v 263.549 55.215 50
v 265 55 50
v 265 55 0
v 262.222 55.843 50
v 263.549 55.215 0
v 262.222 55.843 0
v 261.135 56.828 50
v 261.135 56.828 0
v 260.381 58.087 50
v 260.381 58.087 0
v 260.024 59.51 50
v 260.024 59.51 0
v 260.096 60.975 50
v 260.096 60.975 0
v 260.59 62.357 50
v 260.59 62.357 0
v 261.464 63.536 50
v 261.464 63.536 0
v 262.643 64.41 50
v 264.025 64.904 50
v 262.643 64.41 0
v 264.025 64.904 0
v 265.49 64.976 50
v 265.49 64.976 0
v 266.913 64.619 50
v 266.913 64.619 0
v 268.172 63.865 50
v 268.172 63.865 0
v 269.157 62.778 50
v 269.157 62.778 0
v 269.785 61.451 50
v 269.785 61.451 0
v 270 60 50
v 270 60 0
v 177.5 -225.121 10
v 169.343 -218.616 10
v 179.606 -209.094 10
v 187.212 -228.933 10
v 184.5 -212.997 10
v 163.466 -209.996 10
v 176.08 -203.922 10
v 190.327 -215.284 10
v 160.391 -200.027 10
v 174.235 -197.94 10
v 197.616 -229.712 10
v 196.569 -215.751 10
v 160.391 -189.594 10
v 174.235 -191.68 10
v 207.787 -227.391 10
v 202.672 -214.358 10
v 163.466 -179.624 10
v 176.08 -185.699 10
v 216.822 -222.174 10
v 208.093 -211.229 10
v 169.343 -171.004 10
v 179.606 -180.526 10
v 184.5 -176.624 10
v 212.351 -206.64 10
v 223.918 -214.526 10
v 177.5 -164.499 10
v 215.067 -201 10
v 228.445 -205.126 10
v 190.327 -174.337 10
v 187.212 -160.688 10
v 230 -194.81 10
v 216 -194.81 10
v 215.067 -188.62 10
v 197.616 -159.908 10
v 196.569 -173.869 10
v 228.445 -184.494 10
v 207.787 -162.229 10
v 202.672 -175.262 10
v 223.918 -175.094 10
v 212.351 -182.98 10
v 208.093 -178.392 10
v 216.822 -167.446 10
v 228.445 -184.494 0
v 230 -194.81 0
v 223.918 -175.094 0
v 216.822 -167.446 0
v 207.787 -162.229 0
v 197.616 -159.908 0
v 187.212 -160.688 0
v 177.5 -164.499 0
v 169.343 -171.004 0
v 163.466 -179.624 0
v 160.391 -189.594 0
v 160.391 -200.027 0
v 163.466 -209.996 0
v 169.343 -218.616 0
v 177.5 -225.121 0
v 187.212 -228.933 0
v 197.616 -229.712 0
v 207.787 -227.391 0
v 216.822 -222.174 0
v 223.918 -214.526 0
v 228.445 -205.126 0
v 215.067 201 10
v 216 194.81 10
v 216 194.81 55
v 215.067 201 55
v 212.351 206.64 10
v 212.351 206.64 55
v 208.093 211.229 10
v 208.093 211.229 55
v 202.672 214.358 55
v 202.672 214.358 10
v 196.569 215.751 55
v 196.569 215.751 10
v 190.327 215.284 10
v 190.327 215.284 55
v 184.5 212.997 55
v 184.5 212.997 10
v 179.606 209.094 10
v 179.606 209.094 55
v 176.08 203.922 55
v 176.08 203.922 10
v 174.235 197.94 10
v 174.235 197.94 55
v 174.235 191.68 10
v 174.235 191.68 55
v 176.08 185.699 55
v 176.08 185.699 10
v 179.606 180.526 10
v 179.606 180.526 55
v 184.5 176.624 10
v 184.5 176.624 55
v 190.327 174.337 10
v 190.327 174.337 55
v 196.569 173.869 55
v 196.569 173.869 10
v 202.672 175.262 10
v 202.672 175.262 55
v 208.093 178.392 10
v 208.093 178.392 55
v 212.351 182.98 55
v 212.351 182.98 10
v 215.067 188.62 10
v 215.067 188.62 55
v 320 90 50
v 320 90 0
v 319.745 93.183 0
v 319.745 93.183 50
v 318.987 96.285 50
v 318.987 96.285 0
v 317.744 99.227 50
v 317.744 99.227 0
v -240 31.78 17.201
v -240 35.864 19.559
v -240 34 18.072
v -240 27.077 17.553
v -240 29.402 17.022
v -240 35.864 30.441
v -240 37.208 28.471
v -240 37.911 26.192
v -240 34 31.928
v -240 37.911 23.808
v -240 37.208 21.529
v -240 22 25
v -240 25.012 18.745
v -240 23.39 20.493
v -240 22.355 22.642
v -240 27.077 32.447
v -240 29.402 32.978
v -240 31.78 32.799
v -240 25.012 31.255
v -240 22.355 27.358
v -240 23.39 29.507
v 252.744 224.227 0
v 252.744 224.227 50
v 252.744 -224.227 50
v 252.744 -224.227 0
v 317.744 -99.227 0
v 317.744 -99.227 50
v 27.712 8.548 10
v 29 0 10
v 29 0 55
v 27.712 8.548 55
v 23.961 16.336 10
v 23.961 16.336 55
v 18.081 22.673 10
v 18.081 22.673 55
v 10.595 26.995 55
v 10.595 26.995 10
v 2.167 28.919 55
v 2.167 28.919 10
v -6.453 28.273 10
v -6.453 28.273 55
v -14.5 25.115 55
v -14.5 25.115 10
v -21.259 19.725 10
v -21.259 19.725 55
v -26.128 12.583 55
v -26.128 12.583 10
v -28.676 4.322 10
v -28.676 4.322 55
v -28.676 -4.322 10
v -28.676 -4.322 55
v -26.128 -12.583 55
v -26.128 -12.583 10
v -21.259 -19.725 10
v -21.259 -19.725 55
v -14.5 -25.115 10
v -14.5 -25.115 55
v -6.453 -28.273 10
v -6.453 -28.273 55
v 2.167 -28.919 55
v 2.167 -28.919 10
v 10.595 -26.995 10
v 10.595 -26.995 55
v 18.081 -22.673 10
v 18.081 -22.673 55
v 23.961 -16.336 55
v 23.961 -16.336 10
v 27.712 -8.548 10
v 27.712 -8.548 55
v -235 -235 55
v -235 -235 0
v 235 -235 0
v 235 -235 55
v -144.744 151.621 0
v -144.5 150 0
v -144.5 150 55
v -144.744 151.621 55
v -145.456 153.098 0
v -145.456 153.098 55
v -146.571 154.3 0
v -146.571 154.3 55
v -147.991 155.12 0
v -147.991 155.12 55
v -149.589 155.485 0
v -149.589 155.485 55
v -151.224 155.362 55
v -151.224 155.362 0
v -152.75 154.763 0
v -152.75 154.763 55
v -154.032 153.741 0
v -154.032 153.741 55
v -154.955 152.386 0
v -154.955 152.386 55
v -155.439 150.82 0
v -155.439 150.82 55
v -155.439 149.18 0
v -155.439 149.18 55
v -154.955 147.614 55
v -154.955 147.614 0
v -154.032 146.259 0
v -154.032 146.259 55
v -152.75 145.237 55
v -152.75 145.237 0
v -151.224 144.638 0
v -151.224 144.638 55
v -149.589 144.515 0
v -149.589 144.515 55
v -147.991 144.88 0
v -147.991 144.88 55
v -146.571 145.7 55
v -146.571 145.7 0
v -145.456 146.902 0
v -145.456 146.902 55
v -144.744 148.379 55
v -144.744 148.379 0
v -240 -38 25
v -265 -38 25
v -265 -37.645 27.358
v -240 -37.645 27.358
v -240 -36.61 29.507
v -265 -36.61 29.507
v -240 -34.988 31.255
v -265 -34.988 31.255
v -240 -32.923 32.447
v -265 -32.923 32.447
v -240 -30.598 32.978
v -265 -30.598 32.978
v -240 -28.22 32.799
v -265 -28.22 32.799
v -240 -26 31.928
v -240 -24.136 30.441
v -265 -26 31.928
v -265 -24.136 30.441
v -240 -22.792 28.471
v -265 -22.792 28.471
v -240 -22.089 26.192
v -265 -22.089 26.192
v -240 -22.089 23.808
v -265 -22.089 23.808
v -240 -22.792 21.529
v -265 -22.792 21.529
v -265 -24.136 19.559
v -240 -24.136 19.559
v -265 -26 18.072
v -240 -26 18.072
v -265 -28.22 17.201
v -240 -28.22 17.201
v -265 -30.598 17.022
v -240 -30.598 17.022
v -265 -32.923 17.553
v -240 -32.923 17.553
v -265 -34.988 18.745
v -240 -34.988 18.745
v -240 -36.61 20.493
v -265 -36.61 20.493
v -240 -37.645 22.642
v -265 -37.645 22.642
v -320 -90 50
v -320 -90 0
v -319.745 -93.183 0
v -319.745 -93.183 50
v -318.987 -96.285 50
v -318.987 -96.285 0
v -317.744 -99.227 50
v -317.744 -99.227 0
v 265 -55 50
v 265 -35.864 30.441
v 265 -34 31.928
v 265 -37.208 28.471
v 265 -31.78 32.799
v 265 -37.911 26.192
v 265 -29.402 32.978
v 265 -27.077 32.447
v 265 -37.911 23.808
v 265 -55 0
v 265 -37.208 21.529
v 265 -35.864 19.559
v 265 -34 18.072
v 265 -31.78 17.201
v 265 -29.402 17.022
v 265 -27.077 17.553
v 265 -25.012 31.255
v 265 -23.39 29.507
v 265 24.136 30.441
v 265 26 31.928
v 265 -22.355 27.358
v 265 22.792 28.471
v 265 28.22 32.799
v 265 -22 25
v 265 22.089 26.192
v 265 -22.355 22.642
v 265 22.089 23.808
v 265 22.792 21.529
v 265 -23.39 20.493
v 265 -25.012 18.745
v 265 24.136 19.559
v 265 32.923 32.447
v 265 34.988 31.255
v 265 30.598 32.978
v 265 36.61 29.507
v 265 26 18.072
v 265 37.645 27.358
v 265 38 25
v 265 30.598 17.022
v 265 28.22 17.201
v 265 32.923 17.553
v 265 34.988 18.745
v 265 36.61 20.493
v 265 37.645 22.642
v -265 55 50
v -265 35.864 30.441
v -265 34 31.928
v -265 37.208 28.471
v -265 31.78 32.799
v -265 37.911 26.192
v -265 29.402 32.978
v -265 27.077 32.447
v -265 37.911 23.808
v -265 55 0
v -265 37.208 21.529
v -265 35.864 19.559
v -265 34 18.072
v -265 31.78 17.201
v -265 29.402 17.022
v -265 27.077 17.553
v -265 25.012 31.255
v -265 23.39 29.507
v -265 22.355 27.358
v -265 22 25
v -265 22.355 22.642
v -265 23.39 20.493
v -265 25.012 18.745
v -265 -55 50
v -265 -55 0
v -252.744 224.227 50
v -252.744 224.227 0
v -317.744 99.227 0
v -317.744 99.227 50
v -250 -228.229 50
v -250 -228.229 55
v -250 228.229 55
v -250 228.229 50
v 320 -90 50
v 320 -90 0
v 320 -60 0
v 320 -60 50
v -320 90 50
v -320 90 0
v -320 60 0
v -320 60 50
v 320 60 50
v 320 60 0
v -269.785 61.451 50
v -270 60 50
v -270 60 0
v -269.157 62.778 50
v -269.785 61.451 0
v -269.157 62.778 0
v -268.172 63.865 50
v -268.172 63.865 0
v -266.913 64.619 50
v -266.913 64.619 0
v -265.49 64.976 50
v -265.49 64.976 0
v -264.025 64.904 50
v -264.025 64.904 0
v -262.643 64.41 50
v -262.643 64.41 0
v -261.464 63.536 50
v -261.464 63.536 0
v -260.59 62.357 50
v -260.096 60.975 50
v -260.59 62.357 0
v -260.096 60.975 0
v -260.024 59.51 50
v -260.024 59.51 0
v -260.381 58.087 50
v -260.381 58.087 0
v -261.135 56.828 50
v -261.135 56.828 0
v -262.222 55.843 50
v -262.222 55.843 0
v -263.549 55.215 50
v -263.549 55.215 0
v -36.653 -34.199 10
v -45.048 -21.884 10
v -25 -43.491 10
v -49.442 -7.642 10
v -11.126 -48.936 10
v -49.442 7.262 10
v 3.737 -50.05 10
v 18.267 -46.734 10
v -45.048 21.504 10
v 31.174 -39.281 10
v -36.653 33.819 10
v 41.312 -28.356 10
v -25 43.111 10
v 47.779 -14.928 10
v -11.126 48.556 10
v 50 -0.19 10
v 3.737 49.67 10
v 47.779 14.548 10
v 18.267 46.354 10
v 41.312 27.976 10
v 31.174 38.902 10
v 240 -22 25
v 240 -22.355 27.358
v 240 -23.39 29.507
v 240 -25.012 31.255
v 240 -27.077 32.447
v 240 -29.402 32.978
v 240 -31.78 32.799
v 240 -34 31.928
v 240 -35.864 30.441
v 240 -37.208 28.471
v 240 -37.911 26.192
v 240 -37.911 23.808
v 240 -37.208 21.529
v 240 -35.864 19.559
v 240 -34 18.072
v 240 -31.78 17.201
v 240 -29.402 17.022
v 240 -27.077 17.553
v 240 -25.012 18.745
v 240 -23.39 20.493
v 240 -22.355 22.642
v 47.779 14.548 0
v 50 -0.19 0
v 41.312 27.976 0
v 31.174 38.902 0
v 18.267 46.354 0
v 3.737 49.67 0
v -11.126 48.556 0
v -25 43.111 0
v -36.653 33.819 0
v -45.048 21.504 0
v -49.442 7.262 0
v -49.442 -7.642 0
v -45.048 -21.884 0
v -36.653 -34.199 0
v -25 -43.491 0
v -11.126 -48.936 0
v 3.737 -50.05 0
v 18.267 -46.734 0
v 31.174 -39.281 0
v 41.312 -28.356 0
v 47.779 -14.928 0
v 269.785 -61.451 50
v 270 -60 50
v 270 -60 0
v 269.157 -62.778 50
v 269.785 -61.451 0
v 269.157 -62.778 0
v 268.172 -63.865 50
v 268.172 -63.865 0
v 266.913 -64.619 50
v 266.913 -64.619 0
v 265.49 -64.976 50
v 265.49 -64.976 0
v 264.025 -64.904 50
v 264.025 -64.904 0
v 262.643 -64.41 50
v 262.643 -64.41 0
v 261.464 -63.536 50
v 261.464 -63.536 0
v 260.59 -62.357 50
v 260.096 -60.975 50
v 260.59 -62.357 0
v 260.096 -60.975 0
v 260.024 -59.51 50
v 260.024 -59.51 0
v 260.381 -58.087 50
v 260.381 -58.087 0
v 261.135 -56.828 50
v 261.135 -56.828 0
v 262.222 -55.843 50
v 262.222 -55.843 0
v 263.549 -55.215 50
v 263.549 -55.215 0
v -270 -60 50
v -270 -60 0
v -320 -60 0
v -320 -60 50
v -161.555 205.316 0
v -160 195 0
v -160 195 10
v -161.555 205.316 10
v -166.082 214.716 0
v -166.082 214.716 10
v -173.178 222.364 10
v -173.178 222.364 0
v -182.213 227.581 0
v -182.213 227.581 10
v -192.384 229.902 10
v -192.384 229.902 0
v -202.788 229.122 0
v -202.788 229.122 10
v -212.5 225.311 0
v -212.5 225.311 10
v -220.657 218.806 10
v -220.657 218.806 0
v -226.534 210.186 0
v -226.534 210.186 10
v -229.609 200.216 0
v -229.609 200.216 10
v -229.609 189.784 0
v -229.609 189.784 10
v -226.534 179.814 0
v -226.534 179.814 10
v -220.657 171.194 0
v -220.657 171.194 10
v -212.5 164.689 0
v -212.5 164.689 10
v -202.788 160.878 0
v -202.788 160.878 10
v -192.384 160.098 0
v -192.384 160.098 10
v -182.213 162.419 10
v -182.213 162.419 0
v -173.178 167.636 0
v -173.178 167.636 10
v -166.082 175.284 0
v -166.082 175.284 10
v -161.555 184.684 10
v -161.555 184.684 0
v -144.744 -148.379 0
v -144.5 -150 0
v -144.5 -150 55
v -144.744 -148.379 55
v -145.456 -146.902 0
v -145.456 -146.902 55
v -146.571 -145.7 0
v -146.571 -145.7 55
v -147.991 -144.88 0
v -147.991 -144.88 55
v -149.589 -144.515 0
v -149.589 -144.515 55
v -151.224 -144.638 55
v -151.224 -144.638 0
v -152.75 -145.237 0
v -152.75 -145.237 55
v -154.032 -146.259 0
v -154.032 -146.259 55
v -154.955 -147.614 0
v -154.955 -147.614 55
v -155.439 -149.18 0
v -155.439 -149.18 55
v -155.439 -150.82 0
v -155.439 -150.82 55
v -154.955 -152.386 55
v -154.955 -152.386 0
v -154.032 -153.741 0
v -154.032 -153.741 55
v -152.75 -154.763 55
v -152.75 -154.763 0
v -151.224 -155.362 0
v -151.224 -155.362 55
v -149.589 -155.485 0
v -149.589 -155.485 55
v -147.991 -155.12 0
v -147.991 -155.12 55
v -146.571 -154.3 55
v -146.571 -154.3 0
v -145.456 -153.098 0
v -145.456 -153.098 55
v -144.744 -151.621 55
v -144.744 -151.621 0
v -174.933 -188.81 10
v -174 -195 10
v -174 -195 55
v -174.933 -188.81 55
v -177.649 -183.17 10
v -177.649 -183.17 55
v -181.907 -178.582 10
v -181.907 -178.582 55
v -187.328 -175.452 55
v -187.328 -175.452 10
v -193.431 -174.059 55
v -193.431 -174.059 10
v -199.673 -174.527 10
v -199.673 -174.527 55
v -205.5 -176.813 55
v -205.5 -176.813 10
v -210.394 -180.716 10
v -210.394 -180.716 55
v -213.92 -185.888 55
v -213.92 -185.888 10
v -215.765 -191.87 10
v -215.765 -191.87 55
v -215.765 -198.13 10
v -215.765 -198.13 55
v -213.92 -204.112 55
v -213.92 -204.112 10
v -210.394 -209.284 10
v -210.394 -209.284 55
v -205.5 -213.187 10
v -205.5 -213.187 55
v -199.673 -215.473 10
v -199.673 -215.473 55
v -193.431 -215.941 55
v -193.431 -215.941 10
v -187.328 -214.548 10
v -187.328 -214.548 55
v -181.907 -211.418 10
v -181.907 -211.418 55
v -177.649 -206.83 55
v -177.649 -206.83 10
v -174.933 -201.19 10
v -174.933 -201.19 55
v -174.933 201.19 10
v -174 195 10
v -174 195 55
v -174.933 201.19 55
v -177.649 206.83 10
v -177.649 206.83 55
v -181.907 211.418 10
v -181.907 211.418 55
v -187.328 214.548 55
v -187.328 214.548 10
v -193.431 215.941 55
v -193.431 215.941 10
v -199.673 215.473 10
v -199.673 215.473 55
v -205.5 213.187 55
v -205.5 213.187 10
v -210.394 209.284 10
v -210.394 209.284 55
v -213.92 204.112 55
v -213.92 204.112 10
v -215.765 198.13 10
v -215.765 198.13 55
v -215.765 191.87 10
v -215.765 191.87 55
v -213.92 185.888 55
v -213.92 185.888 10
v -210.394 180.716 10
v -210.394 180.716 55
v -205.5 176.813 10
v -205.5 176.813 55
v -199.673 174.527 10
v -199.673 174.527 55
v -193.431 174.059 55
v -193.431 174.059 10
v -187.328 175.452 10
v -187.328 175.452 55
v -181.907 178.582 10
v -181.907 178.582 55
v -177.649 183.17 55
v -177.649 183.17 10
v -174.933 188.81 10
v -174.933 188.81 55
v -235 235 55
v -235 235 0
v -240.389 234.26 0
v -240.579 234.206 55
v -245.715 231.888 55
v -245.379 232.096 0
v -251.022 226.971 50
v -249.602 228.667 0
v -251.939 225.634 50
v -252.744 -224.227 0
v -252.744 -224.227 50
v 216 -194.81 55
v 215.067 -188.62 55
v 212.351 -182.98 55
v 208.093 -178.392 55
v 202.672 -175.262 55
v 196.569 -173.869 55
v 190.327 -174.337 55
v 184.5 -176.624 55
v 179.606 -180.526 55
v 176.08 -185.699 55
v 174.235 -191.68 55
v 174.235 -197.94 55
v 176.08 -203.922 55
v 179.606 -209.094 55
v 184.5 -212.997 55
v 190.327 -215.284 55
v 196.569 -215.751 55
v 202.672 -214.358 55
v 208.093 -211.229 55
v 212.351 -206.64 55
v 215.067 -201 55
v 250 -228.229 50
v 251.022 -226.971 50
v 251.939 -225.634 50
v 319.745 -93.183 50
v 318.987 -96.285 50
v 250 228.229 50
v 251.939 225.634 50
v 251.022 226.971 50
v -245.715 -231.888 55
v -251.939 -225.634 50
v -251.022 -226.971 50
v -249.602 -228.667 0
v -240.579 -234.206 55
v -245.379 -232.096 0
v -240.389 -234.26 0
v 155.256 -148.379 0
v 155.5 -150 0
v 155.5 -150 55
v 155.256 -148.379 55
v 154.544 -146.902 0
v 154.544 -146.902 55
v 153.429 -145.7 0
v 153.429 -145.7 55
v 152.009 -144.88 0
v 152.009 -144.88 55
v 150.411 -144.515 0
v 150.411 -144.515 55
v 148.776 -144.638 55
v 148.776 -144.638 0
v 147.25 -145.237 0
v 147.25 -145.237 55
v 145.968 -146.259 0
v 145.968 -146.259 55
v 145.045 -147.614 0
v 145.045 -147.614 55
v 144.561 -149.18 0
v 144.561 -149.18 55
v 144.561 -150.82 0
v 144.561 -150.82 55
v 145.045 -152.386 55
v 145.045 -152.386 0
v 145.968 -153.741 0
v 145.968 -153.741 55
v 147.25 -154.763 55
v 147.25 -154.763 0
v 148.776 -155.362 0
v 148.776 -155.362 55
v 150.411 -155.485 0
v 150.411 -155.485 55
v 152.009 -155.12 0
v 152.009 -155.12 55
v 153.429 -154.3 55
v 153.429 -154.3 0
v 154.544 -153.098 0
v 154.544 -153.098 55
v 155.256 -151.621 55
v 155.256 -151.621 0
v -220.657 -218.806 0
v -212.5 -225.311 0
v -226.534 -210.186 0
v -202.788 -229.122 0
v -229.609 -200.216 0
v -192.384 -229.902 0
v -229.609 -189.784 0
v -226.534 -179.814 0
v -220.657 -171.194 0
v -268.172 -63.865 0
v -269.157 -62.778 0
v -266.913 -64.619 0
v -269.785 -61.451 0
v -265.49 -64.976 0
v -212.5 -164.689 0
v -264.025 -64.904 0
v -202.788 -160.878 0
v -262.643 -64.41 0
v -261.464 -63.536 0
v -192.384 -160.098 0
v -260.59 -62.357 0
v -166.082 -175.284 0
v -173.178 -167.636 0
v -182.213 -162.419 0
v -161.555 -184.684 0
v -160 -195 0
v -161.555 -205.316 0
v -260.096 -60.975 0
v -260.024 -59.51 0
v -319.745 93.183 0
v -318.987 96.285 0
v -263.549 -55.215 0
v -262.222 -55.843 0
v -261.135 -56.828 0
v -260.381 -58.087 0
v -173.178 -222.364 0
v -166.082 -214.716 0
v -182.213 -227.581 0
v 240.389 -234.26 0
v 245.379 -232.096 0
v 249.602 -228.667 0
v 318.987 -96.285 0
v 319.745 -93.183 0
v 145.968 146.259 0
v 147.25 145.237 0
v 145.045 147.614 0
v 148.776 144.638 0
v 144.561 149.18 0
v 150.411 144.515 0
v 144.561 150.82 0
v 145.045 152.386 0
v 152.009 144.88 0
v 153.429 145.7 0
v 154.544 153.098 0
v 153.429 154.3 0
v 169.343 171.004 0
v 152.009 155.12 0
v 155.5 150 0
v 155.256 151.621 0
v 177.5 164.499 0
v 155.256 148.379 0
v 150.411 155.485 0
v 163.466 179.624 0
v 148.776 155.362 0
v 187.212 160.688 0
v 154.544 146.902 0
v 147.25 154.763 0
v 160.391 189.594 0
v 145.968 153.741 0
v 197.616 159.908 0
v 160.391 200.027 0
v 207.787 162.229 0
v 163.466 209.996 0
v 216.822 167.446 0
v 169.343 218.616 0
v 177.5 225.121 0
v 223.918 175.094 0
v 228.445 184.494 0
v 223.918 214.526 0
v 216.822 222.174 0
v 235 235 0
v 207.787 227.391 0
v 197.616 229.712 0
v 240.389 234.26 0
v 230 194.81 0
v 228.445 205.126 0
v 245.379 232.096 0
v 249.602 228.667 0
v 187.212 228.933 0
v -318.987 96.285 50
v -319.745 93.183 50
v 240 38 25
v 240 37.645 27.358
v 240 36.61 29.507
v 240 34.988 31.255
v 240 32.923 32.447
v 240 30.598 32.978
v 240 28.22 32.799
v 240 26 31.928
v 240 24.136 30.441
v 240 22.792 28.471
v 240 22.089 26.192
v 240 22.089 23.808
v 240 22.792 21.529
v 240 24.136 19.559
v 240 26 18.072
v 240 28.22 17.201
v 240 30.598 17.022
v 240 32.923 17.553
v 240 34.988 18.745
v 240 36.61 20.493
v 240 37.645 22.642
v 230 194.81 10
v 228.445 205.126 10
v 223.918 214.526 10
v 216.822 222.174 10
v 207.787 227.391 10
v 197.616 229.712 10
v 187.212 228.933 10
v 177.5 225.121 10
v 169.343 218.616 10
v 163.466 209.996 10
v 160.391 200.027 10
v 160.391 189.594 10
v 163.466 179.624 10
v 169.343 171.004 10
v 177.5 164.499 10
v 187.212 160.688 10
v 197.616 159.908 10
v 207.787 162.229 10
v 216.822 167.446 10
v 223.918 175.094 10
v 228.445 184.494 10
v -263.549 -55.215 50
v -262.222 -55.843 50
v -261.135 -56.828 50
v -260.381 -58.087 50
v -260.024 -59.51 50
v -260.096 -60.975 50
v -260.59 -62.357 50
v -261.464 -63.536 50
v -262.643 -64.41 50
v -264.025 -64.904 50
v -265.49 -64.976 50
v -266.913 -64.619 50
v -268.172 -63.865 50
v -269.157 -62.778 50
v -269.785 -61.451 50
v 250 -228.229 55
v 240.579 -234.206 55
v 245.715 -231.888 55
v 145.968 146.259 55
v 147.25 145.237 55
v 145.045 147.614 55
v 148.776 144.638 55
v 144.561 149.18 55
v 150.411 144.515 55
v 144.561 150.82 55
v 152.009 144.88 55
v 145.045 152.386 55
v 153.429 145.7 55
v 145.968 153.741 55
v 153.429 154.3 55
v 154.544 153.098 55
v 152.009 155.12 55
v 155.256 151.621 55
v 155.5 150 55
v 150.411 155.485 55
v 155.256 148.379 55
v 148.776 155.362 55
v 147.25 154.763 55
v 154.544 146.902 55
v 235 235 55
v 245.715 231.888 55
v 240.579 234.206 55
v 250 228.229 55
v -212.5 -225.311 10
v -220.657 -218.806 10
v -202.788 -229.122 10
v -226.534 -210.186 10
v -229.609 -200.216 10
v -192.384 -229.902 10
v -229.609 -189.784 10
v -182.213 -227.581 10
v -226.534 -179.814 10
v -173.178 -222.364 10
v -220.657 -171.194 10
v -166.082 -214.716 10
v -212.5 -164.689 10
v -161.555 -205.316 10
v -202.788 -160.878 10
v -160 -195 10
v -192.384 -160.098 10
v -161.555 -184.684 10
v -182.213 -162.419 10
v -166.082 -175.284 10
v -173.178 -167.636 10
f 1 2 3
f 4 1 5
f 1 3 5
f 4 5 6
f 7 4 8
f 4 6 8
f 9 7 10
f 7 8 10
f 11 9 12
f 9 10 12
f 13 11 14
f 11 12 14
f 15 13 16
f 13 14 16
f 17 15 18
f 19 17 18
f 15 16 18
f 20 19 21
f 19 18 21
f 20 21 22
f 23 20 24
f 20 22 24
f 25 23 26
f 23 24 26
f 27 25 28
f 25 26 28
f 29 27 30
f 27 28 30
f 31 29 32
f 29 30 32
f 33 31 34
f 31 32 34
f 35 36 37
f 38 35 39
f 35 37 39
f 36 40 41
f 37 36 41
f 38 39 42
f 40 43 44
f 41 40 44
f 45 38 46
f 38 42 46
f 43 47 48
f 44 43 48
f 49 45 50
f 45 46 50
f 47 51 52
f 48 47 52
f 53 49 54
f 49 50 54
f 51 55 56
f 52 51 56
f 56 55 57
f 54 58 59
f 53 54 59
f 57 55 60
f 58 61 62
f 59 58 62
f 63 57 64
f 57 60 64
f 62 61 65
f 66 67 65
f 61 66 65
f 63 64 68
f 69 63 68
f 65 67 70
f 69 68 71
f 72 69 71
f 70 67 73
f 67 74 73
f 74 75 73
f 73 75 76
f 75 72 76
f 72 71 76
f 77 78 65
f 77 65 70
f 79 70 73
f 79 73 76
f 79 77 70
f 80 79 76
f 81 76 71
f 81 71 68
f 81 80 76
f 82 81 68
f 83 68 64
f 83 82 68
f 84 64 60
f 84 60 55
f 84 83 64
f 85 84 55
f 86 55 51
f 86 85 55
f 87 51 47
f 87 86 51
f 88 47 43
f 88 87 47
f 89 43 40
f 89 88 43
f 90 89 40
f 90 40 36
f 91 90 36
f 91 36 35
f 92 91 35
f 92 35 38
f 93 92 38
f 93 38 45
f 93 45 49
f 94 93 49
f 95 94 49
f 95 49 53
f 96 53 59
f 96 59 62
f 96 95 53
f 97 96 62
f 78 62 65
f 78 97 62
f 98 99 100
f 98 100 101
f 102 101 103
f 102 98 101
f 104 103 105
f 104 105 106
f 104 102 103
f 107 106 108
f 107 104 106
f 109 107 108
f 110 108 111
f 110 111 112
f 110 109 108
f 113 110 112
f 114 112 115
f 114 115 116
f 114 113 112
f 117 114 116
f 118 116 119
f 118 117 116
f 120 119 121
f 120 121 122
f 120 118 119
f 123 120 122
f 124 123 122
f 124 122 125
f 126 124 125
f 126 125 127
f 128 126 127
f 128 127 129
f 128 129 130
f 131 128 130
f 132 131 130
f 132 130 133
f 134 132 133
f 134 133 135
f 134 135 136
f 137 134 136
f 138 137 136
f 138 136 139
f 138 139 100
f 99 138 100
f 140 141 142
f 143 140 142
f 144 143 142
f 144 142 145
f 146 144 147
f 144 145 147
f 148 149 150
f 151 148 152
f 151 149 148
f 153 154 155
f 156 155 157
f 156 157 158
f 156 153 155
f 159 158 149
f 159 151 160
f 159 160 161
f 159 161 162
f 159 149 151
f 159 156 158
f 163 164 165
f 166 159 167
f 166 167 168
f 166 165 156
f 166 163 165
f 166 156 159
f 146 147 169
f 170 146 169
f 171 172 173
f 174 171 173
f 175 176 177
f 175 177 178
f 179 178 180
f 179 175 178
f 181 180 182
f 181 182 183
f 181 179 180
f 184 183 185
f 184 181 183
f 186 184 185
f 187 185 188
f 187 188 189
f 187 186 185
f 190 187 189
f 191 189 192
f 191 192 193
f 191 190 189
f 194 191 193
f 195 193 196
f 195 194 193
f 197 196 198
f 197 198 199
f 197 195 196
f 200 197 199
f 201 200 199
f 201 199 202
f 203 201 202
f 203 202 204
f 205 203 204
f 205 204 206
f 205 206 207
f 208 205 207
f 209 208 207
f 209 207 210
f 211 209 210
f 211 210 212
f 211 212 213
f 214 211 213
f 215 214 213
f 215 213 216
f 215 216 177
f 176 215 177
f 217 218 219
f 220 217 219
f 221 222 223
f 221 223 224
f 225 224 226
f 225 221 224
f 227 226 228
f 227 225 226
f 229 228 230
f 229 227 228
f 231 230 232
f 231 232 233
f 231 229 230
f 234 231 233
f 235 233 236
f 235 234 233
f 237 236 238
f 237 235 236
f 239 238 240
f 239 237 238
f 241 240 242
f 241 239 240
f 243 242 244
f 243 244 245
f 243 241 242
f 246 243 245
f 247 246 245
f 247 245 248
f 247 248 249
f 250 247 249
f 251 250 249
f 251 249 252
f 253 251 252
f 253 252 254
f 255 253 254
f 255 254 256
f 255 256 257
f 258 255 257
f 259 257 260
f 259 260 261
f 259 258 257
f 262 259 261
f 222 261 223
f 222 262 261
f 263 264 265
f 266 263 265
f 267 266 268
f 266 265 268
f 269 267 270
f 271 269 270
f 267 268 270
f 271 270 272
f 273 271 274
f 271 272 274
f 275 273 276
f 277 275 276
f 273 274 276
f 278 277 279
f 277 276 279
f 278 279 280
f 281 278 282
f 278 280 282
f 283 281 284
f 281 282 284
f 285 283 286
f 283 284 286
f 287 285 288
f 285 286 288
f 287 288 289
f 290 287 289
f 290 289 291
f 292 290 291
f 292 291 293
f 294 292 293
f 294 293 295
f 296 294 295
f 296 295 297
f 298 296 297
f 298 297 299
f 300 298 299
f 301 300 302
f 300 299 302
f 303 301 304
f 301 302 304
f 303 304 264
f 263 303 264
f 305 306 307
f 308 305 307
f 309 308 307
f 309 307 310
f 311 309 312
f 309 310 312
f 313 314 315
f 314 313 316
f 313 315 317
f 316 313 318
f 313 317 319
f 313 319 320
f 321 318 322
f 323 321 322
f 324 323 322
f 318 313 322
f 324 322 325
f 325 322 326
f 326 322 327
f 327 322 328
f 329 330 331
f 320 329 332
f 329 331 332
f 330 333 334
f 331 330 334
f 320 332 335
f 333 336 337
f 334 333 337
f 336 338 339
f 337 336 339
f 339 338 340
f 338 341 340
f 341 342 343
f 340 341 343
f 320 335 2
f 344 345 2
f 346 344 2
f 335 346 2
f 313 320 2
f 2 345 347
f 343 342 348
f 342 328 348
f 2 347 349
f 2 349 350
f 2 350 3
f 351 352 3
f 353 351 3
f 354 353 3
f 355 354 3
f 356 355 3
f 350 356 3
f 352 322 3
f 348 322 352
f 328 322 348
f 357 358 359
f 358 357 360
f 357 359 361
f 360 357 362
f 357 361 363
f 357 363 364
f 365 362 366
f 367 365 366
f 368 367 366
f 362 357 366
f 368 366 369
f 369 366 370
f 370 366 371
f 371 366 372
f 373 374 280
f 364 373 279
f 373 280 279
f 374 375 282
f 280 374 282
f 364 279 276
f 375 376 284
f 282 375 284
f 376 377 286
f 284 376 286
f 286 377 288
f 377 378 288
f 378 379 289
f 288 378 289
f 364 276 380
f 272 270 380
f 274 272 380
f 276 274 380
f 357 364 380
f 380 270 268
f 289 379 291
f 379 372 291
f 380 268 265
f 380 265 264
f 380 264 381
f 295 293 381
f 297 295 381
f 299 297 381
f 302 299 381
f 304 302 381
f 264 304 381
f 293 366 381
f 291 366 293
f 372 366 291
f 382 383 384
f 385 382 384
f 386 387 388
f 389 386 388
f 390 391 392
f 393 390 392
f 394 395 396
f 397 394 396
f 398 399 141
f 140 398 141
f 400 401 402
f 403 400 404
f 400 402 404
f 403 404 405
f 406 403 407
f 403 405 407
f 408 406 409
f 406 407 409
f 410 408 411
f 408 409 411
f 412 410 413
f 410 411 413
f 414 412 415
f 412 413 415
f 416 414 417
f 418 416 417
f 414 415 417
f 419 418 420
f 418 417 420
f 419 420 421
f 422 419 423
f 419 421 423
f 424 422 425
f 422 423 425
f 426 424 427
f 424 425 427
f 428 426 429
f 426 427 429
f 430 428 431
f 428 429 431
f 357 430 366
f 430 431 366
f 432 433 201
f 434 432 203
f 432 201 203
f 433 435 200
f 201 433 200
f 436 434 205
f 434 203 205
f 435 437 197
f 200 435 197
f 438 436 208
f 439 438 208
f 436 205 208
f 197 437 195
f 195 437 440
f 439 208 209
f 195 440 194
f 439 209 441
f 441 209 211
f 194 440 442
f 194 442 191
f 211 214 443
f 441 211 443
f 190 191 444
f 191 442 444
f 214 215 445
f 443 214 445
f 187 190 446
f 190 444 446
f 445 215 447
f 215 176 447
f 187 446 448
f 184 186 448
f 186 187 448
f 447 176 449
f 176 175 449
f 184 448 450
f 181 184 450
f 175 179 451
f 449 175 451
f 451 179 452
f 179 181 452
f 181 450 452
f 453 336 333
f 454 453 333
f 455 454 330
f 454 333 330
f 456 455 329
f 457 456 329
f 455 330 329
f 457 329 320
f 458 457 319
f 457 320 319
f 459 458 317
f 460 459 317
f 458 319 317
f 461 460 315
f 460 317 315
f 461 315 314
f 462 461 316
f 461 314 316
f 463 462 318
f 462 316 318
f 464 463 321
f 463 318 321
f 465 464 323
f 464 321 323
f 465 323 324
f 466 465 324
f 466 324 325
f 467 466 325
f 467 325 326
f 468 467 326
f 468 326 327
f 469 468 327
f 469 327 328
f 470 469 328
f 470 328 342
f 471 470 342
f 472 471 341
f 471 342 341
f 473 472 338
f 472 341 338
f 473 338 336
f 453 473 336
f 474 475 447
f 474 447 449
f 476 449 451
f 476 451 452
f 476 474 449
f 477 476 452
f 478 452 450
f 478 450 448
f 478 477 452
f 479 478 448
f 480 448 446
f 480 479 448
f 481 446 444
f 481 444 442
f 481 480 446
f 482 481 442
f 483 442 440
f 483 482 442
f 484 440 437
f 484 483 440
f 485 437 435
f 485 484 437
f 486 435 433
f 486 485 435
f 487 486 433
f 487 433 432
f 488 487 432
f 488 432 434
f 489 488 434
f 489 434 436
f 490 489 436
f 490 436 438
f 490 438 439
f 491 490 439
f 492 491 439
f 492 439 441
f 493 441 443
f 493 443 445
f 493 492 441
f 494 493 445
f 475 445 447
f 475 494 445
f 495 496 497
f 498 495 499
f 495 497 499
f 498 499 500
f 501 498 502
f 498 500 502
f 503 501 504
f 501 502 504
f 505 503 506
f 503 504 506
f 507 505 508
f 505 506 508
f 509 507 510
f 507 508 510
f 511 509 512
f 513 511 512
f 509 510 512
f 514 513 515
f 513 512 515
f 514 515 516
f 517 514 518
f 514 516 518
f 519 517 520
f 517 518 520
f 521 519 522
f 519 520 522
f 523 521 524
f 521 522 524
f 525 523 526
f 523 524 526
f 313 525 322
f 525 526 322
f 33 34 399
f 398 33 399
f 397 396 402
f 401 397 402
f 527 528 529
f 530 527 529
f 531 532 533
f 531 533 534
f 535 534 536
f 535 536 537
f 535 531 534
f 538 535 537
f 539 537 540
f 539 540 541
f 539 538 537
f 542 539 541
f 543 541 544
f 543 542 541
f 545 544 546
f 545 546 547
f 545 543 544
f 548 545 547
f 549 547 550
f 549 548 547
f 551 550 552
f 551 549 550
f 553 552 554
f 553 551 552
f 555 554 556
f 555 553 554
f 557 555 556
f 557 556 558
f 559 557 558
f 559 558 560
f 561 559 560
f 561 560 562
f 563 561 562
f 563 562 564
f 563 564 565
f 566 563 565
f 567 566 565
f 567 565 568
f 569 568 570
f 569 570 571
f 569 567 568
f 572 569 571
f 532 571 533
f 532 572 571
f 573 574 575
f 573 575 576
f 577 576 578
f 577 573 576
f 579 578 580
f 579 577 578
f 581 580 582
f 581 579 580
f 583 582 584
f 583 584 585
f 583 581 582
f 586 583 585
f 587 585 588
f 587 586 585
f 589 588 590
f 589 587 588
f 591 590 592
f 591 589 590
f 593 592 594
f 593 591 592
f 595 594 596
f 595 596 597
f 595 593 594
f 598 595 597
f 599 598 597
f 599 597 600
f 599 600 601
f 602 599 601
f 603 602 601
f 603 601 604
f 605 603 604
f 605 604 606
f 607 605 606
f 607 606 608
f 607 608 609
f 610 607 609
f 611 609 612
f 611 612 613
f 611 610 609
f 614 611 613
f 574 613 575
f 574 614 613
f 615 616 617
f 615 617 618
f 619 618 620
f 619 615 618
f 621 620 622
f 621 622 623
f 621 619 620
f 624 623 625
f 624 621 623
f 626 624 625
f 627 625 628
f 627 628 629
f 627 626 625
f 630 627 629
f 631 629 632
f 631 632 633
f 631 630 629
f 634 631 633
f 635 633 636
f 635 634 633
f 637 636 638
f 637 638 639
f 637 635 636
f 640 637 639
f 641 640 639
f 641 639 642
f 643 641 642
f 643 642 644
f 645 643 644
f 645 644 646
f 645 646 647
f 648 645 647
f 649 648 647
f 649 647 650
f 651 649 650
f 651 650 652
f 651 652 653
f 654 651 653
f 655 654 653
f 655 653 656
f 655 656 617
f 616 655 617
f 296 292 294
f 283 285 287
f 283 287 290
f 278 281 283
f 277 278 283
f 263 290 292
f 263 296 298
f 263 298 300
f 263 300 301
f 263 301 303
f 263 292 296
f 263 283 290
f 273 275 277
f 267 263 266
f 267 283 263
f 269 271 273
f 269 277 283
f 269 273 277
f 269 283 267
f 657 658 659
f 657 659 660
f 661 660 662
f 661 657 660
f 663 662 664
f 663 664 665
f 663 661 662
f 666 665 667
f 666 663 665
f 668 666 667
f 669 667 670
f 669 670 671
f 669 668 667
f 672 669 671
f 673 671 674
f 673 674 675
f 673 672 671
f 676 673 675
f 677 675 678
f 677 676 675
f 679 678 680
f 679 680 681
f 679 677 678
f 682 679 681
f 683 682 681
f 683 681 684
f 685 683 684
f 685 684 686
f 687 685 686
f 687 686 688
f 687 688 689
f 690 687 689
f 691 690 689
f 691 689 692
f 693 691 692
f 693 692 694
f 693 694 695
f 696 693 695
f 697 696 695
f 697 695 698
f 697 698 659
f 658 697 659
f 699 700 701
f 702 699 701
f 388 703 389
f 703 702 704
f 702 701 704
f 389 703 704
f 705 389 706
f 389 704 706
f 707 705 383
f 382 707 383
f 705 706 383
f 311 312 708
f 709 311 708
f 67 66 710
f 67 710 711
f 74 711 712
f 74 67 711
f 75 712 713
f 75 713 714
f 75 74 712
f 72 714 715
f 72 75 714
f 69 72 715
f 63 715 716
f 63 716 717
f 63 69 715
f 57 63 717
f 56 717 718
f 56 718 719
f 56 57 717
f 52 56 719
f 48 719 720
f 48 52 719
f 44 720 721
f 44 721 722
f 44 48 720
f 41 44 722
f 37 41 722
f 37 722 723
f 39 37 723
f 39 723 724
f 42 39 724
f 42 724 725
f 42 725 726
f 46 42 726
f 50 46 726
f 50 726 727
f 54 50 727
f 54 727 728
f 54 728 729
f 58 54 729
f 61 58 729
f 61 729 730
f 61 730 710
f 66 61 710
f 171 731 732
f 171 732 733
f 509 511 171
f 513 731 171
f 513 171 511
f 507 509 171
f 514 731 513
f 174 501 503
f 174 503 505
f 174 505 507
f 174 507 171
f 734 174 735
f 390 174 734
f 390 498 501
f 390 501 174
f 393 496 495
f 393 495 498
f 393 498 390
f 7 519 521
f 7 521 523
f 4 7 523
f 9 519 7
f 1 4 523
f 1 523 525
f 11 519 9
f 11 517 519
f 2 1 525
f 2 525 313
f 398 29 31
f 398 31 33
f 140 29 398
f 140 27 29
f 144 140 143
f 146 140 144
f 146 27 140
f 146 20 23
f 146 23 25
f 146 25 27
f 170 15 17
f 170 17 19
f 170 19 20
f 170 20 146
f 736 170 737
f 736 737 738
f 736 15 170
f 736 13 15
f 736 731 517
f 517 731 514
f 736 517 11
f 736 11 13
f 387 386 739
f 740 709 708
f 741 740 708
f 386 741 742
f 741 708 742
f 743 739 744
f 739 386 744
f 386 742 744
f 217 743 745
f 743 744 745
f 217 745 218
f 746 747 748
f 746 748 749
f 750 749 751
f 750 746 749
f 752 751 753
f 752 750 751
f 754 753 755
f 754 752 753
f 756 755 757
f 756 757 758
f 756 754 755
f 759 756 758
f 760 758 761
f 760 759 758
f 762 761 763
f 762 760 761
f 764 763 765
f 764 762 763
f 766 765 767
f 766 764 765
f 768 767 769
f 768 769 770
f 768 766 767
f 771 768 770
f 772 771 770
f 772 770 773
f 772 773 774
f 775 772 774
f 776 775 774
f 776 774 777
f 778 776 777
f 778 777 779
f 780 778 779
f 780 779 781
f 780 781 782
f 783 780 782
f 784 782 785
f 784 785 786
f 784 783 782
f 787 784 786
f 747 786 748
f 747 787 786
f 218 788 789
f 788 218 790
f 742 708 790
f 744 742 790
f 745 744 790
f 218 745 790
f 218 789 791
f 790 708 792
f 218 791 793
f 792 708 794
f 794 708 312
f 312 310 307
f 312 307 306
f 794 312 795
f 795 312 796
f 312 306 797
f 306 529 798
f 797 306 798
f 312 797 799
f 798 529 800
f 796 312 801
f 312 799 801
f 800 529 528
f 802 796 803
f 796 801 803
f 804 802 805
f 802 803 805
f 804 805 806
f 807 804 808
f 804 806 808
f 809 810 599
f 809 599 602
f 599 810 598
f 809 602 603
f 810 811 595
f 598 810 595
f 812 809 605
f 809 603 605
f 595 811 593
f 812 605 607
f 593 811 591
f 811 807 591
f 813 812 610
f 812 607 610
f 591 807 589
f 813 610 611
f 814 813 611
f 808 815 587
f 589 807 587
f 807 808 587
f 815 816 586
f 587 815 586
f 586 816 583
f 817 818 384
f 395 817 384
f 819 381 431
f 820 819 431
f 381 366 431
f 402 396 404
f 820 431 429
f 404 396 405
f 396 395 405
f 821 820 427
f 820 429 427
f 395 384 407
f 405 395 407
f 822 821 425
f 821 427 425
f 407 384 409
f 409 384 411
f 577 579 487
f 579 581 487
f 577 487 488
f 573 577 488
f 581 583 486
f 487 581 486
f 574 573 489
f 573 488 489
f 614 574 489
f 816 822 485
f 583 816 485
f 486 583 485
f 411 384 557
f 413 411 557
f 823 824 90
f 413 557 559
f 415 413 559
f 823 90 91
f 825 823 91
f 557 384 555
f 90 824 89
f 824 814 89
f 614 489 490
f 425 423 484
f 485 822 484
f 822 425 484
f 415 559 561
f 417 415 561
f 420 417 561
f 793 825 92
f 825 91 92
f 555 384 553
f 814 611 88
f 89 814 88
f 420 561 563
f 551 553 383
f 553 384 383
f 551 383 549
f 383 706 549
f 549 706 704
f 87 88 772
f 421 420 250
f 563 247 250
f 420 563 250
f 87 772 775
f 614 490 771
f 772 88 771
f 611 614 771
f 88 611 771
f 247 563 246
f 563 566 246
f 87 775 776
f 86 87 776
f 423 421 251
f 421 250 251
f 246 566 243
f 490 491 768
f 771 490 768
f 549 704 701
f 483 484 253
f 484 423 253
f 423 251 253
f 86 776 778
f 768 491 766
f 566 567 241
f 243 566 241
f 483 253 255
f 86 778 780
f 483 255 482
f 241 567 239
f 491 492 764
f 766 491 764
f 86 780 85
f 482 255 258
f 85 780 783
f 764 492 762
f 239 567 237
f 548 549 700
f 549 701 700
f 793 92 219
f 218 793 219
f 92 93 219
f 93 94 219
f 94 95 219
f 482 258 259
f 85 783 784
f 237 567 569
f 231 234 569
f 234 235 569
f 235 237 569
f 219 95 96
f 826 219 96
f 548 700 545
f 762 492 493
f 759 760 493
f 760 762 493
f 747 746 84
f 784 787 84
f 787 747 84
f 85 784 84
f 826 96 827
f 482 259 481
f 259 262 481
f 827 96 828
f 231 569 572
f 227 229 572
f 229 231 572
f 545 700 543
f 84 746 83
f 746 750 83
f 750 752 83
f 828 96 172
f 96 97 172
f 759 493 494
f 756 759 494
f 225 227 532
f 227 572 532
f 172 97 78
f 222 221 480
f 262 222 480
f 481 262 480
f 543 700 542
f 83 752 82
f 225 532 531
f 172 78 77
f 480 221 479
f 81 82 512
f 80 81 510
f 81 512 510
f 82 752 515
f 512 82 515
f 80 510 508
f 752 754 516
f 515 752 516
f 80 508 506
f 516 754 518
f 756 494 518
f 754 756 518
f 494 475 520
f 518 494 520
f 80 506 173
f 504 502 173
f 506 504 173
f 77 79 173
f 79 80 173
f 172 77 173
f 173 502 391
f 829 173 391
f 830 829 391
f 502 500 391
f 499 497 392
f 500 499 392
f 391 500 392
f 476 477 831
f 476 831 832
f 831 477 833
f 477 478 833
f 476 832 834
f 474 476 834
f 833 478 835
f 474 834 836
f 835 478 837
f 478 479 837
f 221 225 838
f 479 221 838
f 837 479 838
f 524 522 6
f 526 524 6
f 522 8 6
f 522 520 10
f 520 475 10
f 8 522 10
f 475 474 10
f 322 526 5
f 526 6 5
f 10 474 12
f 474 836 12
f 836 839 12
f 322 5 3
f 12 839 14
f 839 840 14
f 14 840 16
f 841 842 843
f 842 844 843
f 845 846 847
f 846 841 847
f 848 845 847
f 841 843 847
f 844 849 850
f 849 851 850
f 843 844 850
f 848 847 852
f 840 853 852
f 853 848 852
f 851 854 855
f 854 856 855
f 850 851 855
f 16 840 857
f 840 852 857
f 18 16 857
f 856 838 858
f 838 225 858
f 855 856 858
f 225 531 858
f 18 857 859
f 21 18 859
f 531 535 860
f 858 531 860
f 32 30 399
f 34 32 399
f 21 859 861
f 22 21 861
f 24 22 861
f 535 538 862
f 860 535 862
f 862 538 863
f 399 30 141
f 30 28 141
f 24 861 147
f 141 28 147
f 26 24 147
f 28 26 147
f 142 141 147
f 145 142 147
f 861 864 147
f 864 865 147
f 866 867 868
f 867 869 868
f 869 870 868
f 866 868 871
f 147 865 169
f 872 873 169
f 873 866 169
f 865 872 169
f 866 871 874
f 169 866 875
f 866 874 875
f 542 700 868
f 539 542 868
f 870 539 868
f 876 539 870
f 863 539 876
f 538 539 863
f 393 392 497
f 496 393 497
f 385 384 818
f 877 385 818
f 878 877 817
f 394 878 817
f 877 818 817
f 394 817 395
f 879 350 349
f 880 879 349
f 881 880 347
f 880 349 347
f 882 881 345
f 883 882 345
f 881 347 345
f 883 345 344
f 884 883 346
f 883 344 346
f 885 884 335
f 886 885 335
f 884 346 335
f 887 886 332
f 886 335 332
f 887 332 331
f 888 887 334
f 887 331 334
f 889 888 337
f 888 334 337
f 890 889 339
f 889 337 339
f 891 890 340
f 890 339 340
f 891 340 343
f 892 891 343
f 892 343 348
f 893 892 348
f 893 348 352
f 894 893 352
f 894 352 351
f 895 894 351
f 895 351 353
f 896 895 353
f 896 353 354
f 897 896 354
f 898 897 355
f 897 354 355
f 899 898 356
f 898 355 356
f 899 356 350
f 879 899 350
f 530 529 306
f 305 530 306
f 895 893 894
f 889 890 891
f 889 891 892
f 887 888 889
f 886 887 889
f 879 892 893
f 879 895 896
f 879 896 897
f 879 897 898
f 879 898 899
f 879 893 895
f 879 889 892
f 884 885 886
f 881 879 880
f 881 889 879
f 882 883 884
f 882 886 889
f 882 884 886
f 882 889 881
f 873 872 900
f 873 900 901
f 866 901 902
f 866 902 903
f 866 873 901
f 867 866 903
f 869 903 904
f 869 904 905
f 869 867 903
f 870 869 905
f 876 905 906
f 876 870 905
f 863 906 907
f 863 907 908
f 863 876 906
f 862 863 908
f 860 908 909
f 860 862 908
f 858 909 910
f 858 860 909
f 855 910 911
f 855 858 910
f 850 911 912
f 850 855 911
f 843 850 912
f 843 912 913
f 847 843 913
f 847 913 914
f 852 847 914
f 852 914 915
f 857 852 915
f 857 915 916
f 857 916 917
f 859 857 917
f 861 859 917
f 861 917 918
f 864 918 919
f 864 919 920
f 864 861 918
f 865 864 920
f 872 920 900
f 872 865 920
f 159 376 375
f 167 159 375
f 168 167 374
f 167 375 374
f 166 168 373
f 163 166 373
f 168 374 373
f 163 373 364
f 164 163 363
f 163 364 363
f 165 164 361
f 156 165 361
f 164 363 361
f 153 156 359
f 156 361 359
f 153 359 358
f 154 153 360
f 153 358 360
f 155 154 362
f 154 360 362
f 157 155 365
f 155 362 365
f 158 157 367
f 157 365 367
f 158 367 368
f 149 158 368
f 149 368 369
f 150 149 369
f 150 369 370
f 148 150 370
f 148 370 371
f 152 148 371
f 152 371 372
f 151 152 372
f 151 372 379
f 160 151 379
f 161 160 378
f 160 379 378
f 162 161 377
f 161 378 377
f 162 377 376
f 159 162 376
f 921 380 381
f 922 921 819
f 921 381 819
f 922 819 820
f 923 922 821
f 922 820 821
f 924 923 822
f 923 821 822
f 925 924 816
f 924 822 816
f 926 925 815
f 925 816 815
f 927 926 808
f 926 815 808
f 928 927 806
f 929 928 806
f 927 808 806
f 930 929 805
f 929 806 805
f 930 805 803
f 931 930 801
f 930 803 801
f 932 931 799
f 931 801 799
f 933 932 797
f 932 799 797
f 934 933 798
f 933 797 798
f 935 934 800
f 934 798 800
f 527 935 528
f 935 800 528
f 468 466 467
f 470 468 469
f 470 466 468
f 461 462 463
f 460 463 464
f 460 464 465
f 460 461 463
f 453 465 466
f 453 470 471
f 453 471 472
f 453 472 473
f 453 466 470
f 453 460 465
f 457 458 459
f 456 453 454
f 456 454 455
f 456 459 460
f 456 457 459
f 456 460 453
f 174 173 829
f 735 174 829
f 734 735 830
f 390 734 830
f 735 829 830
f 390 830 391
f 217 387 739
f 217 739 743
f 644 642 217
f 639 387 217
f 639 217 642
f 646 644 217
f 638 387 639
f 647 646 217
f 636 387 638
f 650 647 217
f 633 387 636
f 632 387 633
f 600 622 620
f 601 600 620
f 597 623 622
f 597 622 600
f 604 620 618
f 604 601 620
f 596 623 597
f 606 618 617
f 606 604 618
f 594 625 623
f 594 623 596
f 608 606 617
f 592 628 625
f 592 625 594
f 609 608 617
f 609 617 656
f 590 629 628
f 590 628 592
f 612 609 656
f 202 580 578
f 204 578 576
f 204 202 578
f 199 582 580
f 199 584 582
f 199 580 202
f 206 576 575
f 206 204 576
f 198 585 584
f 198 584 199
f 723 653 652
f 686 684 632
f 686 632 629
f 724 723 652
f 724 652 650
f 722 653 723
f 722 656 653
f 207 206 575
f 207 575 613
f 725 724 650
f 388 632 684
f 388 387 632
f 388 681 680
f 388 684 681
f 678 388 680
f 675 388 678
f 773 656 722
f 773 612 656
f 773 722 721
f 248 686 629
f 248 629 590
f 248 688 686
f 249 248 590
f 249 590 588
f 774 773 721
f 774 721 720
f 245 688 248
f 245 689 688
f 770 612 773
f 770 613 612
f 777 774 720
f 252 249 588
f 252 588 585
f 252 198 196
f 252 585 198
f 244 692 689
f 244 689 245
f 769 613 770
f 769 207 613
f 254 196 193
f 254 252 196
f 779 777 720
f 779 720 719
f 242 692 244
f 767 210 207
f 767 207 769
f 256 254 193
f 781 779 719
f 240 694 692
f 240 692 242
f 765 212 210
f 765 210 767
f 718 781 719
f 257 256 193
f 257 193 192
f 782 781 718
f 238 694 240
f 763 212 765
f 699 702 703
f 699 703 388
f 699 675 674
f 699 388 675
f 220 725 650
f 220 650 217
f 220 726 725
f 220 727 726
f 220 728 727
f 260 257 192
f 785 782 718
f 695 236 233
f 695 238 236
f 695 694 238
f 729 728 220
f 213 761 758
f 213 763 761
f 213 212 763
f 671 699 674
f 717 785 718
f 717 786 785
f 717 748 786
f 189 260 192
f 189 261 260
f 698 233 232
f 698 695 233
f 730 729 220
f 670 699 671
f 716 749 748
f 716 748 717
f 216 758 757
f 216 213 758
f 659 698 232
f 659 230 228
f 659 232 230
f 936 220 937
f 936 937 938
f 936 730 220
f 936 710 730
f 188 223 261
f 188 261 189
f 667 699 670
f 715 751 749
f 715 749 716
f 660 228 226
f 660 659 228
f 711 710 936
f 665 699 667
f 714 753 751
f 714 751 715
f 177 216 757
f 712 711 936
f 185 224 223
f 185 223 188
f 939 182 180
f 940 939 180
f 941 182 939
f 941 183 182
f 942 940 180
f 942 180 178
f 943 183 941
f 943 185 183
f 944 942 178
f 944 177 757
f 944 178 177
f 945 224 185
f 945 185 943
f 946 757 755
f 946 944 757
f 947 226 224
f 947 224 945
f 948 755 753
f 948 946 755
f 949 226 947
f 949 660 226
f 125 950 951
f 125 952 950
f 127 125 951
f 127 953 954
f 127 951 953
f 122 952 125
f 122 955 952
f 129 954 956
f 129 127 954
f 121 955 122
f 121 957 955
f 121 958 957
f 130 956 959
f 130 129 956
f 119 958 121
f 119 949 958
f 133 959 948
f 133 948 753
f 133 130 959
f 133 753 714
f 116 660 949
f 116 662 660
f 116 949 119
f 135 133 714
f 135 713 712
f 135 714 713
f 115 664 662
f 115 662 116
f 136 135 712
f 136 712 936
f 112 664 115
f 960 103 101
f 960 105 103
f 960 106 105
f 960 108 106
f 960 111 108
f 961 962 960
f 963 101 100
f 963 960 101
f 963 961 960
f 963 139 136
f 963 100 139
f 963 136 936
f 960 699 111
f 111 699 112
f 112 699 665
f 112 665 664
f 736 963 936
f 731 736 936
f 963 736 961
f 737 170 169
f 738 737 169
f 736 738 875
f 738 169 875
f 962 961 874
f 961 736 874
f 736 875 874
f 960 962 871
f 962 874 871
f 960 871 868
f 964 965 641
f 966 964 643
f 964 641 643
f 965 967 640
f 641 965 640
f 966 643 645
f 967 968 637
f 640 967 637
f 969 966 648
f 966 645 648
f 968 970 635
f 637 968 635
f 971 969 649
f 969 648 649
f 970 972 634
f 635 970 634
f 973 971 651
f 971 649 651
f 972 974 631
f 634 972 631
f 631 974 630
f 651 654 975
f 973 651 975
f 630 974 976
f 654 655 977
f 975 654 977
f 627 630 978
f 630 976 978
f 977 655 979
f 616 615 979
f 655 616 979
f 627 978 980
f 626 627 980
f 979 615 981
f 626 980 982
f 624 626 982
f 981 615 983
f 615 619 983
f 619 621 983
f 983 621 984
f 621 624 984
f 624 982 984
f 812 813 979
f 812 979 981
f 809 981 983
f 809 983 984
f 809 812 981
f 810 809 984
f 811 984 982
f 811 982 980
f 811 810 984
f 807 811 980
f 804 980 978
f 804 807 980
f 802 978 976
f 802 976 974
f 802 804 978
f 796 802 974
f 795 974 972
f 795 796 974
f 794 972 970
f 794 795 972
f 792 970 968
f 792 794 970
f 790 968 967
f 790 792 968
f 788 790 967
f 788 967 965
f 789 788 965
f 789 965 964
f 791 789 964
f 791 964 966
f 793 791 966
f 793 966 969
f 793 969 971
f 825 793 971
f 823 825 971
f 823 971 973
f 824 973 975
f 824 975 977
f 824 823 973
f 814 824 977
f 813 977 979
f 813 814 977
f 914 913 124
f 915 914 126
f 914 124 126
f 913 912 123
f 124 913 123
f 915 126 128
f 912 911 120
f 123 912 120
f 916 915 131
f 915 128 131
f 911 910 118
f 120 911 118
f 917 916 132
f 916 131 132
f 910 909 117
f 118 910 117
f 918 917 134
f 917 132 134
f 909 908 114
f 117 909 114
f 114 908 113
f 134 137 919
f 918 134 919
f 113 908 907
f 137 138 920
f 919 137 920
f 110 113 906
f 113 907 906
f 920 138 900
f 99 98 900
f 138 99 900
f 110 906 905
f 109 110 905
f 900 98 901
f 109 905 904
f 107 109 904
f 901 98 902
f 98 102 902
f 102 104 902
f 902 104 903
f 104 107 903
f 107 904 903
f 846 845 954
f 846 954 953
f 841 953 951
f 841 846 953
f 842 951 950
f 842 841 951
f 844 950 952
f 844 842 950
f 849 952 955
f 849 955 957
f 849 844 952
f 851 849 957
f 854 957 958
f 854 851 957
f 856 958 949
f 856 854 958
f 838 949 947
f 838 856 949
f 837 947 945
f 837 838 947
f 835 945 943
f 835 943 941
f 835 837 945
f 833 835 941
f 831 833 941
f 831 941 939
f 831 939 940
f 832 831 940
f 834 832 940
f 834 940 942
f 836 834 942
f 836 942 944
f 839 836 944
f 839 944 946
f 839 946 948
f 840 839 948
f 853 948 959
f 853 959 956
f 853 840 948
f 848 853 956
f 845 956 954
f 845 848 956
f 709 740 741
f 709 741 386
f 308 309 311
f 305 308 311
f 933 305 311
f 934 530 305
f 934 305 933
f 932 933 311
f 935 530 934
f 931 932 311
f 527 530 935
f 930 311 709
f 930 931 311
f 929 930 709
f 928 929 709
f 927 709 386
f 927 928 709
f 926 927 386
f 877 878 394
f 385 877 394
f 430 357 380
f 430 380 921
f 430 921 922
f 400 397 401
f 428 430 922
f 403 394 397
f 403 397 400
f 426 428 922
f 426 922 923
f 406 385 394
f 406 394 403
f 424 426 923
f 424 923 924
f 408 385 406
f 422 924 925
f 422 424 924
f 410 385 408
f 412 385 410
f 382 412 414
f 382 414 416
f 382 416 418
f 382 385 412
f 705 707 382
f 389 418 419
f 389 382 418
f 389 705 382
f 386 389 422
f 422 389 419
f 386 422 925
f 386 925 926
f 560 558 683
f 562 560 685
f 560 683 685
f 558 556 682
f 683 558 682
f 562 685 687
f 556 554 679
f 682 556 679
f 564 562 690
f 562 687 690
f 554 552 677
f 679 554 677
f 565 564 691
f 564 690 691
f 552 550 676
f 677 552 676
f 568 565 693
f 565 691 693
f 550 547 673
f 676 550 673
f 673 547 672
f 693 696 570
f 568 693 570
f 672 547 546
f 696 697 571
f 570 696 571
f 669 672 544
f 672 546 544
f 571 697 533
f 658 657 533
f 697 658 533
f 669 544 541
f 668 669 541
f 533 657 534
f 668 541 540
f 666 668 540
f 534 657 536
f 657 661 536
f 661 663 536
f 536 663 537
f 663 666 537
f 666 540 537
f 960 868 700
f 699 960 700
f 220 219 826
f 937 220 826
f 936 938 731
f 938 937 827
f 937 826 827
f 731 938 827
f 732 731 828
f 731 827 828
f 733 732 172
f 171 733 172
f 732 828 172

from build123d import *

# Parameters (mm, degrees)
F0_R     = 35
F0_R_2   = 5.5
F0_R_3   = 50
F0_R_4   = 29
F0_R_5   = 21
F1_DEPTH = 55
F2_DEPTH = 10
F4_DEPTH = 5
F5_R     = 8
F6_DEPTH = 25
F7_R     = 8
F8_DEPTH = 25


# Not quite as in the source:
# - ends of sketch curves that miss each other by under 0.0002 mm in the source are joined


with BuildPart() as f1:
    # F0 (on Top) → F1 (new body)
    with BuildSketch(Plane.XY):
        with BuildLine():
            ThreePointArc((-265, -55), (-261.4644660941, -63.5355339059), (-270, -60))
            Line((-270, -60), (-320, -60))
            Line((-320, -60), (-320, -90))
            ThreePointArc((-320, -90), (-319.427901562, -94.7493832125), (-317.7443359101, -99.2270549532))
            Line((-317.7443359101, -99.2270549532), (-252.744336, -224.227055))
            ThreePointArc((-252.744336, -224.227055), (-245.3792798627, -232.0959220147), (-235, -235))
            Line((-235, -235), (235, -235))
            ThreePointArc((235, -235), (245.3792798627, -232.0959220147), (252.7443359101, -224.2270549532))
            Line((252.7443359101, -224.2270549532), (317.744336, -99.227055))
            ThreePointArc((317.744336, -99.227055), (319.427901562, -94.7493832125), (320, -90))
            Line((320, -90), (320, -60))
            Line((320, -60), (270, -60))
            ThreePointArc((270, -60), (261.4644660941, -63.5355339059), (265, -55))
            Line((265, -55), (265, 55))
            ThreePointArc((265, 55), (261.4644660941, 63.5355339059), (270, 60))
            Line((270, 60), (320, 60))
            Line((320, 60), (320, 90))
            ThreePointArc((320, 90), (319.427901562, 94.7493832125), (317.7443359101, 99.2270549532))
            Line((317.7443359101, 99.2270549532), (252.744336, 224.227055))
            ThreePointArc((252.744336, 224.227055), (245.3792798627, 232.0959220147), (235, 235))
            Line((235, 235), (-235, 235))
            ThreePointArc((-235, 235), (-245.3792798627, 232.0959220147), (-252.7443359101, 224.2270549532))
            Line((-252.7443359101, 224.2270549532), (-317.744336, 99.227055))
            ThreePointArc((-317.744336, 99.227055), (-319.427901562, 94.7493832125), (-320, 90))
            Line((-320, 90), (-320, 60))
            Line((-320, 60), (-270, 60))
            ThreePointArc((-270, 60), (-261.4644660941, 63.5355339059), (-265, 55))
            Line((-265, 55), (-265, -55))
        make_face()
        with Locations((-195, -195)):
            Circle(F0_R, mode=Mode.SUBTRACT)
        with Locations((-150, -150)):
            Circle(F0_R_2, mode=Mode.SUBTRACT)
        with Locations((150, -150)):
            Circle(F0_R_2, mode=Mode.SUBTRACT)
        with Locations((195, -194.81006)):
            Circle(F0_R, mode=Mode.SUBTRACT)
        with Locations((0, -0.1899)):
            Circle(F0_R_3, mode=Mode.SUBTRACT)
        with Locations((-195, 195)):
            Circle(F0_R, mode=Mode.SUBTRACT)
        with Locations((-150, 150)):
            Circle(F0_R_2, mode=Mode.SUBTRACT)
        with Locations((150, 150)):
            Circle(F0_R_2, mode=Mode.SUBTRACT)
        with Locations((195, 194.810059)):
            Circle(F0_R, mode=Mode.SUBTRACT)
        with Locations((0, -0.1899)):
            Circle(F0_R_3)
        with Locations((0, 4e-05)):
            Circle(F0_R_4, mode=Mode.SUBTRACT)
        with Locations((-195, 195)):
            Circle(F0_R)
        with Locations((-195, 195)):
            Circle(F0_R_5, mode=Mode.SUBTRACT)
        with Locations((195, 194.810059)):
            Circle(F0_R)
        with Locations((195, 194.810059)):
            Circle(F0_R_5, mode=Mode.SUBTRACT)
        with Locations((-195, -195)):
            Circle(F0_R)
        with Locations((-195, -195)):
            Circle(F0_R_5, mode=Mode.SUBTRACT)
        with Locations((195, -194.81006)):
            Circle(F0_R)
        with Locations((195, -194.81006)):
            Circle(F0_R_5, mode=Mode.SUBTRACT)
    extrude(amount=F1_DEPTH)

    # F0 (on Top) → F2 (cut)
    with BuildSketch(Plane.XY):
        with Locations((195, 194.810059)):
            Circle(F0_R)
        with Locations((195, 194.810059)):
            Circle(F0_R_5, mode=Mode.SUBTRACT)
        with Locations((-195, 195)):
            Circle(F0_R)
        with Locations((-195, 195)):
            Circle(F0_R_5, mode=Mode.SUBTRACT)
        with Locations((0, -0.1899)):
            Circle(F0_R_3)
        with Locations((0, 4e-05)):
            Circle(F0_R_4, mode=Mode.SUBTRACT)
        with Locations((-195, -195)):
            Circle(F0_R)
        with Locations((-195, -195)):
            Circle(F0_R_5, mode=Mode.SUBTRACT)
        with Locations((195, -194.81006)):
            Circle(F0_R)
        with Locations((195, -194.81006)):
            Circle(F0_R_5, mode=Mode.SUBTRACT)
    extrude(amount=F2_DEPTH, mode=Mode.SUBTRACT)

    # F3 (on face) → F4 (cut)
    with BuildSketch(Plane.XY.offset(55)):
        with BuildLine():
            Line((270, 60), (320, 60))
            Line((320, 60), (320, 90))
            ThreePointArc((320, 90), (319.427901562, 94.7493832125), (317.7443359101, 99.2270549532))
            Line((317.7443359101, 99.2270549532), (252.744336, 224.227055))
            ThreePointArc((252.744336, 224.227055), (251.4939773544, 226.311441724), (250, 228.2287566232))
            Line((250, 228.2287566232), (250, -228.2287565553))
            ThreePointArc((250, -228.2287565553), (251.4939773092, -226.3114416643), (252.7443359101, -224.2270549532))
            Line((252.7443359101, -224.2270549532), (317.744336, -99.227055))
            ThreePointArc((317.744336, -99.227055), (319.4279015605, -94.7493832184), (320, -90))
            Line((320, -90), (320, -60))
            Line((320, -60), (270, -60))
            ThreePointArc((270, -60), (261.4644660941, -63.5355339059), (265, -55))
            Line((265, -55), (265, 55))
            ThreePointArc((265, 55), (261.4644660941, 63.5355339059), (270, 60))
        make_face()
        with BuildLine():
            Line((-250, -228.2287566232), (-250, 228.2287565553))
            ThreePointArc((-250, 228.2287565553), (-251.4939773092, 226.3114416643), (-252.7443359101, 224.2270549532))
            Line((-252.7443359101, 224.2270549532), (-317.744336, 99.227055))
            ThreePointArc((-317.744336, 99.227055), (-319.4279015605, 94.7493832184), (-320, 90))
            Line((-320, 90), (-320, 60))
            Line((-320, 60), (-270, 60))
            ThreePointArc((-270, 60), (-261.4644660941, 63.5355339059), (-265, 55))
            Line((-265, 55), (-265, -55))
            ThreePointArc((-265, -55), (-261.4644660941, -63.5355339059), (-270, -60))
            Line((-270, -60), (-320, -60))
            Line((-320, -60), (-320, -90))
            ThreePointArc((-320, -90), (-319.427901562, -94.7493832125), (-317.7443359101, -99.2270549532))
            Line((-317.7443359101, -99.2270549532), (-252.744336, -224.227055))
            ThreePointArc((-252.744336, -224.227055), (-251.4939773544, -226.311441724), (-250, -228.2287566232))
        make_face()
    extrude(amount=-F4_DEPTH, mode=Mode.SUBTRACT)

    # F5 (on face) → F6 (cut)
    with BuildSketch(Plane.YZ.offset(265)):
        with Locations((30, 25)):
            Circle(F5_R)
        with Locations((-30, 25)):
            Circle(F5_R)
    extrude(amount=-F6_DEPTH, mode=Mode.SUBTRACT)

    # F7 (on face) → F8 (cut)
    with BuildSketch(Plane(origin=(-265, 0, 0), x_dir=(0, -1, 0), z_dir=(-1, 0, 0))):
        with Locations((-30, 25)):
            Circle(F7_R)
        with Locations((30, 25)):
            Circle(F7_R)
    extrude(amount=-F8_DEPTH, mode=Mode.SUBTRACT)


solid = f1.part
